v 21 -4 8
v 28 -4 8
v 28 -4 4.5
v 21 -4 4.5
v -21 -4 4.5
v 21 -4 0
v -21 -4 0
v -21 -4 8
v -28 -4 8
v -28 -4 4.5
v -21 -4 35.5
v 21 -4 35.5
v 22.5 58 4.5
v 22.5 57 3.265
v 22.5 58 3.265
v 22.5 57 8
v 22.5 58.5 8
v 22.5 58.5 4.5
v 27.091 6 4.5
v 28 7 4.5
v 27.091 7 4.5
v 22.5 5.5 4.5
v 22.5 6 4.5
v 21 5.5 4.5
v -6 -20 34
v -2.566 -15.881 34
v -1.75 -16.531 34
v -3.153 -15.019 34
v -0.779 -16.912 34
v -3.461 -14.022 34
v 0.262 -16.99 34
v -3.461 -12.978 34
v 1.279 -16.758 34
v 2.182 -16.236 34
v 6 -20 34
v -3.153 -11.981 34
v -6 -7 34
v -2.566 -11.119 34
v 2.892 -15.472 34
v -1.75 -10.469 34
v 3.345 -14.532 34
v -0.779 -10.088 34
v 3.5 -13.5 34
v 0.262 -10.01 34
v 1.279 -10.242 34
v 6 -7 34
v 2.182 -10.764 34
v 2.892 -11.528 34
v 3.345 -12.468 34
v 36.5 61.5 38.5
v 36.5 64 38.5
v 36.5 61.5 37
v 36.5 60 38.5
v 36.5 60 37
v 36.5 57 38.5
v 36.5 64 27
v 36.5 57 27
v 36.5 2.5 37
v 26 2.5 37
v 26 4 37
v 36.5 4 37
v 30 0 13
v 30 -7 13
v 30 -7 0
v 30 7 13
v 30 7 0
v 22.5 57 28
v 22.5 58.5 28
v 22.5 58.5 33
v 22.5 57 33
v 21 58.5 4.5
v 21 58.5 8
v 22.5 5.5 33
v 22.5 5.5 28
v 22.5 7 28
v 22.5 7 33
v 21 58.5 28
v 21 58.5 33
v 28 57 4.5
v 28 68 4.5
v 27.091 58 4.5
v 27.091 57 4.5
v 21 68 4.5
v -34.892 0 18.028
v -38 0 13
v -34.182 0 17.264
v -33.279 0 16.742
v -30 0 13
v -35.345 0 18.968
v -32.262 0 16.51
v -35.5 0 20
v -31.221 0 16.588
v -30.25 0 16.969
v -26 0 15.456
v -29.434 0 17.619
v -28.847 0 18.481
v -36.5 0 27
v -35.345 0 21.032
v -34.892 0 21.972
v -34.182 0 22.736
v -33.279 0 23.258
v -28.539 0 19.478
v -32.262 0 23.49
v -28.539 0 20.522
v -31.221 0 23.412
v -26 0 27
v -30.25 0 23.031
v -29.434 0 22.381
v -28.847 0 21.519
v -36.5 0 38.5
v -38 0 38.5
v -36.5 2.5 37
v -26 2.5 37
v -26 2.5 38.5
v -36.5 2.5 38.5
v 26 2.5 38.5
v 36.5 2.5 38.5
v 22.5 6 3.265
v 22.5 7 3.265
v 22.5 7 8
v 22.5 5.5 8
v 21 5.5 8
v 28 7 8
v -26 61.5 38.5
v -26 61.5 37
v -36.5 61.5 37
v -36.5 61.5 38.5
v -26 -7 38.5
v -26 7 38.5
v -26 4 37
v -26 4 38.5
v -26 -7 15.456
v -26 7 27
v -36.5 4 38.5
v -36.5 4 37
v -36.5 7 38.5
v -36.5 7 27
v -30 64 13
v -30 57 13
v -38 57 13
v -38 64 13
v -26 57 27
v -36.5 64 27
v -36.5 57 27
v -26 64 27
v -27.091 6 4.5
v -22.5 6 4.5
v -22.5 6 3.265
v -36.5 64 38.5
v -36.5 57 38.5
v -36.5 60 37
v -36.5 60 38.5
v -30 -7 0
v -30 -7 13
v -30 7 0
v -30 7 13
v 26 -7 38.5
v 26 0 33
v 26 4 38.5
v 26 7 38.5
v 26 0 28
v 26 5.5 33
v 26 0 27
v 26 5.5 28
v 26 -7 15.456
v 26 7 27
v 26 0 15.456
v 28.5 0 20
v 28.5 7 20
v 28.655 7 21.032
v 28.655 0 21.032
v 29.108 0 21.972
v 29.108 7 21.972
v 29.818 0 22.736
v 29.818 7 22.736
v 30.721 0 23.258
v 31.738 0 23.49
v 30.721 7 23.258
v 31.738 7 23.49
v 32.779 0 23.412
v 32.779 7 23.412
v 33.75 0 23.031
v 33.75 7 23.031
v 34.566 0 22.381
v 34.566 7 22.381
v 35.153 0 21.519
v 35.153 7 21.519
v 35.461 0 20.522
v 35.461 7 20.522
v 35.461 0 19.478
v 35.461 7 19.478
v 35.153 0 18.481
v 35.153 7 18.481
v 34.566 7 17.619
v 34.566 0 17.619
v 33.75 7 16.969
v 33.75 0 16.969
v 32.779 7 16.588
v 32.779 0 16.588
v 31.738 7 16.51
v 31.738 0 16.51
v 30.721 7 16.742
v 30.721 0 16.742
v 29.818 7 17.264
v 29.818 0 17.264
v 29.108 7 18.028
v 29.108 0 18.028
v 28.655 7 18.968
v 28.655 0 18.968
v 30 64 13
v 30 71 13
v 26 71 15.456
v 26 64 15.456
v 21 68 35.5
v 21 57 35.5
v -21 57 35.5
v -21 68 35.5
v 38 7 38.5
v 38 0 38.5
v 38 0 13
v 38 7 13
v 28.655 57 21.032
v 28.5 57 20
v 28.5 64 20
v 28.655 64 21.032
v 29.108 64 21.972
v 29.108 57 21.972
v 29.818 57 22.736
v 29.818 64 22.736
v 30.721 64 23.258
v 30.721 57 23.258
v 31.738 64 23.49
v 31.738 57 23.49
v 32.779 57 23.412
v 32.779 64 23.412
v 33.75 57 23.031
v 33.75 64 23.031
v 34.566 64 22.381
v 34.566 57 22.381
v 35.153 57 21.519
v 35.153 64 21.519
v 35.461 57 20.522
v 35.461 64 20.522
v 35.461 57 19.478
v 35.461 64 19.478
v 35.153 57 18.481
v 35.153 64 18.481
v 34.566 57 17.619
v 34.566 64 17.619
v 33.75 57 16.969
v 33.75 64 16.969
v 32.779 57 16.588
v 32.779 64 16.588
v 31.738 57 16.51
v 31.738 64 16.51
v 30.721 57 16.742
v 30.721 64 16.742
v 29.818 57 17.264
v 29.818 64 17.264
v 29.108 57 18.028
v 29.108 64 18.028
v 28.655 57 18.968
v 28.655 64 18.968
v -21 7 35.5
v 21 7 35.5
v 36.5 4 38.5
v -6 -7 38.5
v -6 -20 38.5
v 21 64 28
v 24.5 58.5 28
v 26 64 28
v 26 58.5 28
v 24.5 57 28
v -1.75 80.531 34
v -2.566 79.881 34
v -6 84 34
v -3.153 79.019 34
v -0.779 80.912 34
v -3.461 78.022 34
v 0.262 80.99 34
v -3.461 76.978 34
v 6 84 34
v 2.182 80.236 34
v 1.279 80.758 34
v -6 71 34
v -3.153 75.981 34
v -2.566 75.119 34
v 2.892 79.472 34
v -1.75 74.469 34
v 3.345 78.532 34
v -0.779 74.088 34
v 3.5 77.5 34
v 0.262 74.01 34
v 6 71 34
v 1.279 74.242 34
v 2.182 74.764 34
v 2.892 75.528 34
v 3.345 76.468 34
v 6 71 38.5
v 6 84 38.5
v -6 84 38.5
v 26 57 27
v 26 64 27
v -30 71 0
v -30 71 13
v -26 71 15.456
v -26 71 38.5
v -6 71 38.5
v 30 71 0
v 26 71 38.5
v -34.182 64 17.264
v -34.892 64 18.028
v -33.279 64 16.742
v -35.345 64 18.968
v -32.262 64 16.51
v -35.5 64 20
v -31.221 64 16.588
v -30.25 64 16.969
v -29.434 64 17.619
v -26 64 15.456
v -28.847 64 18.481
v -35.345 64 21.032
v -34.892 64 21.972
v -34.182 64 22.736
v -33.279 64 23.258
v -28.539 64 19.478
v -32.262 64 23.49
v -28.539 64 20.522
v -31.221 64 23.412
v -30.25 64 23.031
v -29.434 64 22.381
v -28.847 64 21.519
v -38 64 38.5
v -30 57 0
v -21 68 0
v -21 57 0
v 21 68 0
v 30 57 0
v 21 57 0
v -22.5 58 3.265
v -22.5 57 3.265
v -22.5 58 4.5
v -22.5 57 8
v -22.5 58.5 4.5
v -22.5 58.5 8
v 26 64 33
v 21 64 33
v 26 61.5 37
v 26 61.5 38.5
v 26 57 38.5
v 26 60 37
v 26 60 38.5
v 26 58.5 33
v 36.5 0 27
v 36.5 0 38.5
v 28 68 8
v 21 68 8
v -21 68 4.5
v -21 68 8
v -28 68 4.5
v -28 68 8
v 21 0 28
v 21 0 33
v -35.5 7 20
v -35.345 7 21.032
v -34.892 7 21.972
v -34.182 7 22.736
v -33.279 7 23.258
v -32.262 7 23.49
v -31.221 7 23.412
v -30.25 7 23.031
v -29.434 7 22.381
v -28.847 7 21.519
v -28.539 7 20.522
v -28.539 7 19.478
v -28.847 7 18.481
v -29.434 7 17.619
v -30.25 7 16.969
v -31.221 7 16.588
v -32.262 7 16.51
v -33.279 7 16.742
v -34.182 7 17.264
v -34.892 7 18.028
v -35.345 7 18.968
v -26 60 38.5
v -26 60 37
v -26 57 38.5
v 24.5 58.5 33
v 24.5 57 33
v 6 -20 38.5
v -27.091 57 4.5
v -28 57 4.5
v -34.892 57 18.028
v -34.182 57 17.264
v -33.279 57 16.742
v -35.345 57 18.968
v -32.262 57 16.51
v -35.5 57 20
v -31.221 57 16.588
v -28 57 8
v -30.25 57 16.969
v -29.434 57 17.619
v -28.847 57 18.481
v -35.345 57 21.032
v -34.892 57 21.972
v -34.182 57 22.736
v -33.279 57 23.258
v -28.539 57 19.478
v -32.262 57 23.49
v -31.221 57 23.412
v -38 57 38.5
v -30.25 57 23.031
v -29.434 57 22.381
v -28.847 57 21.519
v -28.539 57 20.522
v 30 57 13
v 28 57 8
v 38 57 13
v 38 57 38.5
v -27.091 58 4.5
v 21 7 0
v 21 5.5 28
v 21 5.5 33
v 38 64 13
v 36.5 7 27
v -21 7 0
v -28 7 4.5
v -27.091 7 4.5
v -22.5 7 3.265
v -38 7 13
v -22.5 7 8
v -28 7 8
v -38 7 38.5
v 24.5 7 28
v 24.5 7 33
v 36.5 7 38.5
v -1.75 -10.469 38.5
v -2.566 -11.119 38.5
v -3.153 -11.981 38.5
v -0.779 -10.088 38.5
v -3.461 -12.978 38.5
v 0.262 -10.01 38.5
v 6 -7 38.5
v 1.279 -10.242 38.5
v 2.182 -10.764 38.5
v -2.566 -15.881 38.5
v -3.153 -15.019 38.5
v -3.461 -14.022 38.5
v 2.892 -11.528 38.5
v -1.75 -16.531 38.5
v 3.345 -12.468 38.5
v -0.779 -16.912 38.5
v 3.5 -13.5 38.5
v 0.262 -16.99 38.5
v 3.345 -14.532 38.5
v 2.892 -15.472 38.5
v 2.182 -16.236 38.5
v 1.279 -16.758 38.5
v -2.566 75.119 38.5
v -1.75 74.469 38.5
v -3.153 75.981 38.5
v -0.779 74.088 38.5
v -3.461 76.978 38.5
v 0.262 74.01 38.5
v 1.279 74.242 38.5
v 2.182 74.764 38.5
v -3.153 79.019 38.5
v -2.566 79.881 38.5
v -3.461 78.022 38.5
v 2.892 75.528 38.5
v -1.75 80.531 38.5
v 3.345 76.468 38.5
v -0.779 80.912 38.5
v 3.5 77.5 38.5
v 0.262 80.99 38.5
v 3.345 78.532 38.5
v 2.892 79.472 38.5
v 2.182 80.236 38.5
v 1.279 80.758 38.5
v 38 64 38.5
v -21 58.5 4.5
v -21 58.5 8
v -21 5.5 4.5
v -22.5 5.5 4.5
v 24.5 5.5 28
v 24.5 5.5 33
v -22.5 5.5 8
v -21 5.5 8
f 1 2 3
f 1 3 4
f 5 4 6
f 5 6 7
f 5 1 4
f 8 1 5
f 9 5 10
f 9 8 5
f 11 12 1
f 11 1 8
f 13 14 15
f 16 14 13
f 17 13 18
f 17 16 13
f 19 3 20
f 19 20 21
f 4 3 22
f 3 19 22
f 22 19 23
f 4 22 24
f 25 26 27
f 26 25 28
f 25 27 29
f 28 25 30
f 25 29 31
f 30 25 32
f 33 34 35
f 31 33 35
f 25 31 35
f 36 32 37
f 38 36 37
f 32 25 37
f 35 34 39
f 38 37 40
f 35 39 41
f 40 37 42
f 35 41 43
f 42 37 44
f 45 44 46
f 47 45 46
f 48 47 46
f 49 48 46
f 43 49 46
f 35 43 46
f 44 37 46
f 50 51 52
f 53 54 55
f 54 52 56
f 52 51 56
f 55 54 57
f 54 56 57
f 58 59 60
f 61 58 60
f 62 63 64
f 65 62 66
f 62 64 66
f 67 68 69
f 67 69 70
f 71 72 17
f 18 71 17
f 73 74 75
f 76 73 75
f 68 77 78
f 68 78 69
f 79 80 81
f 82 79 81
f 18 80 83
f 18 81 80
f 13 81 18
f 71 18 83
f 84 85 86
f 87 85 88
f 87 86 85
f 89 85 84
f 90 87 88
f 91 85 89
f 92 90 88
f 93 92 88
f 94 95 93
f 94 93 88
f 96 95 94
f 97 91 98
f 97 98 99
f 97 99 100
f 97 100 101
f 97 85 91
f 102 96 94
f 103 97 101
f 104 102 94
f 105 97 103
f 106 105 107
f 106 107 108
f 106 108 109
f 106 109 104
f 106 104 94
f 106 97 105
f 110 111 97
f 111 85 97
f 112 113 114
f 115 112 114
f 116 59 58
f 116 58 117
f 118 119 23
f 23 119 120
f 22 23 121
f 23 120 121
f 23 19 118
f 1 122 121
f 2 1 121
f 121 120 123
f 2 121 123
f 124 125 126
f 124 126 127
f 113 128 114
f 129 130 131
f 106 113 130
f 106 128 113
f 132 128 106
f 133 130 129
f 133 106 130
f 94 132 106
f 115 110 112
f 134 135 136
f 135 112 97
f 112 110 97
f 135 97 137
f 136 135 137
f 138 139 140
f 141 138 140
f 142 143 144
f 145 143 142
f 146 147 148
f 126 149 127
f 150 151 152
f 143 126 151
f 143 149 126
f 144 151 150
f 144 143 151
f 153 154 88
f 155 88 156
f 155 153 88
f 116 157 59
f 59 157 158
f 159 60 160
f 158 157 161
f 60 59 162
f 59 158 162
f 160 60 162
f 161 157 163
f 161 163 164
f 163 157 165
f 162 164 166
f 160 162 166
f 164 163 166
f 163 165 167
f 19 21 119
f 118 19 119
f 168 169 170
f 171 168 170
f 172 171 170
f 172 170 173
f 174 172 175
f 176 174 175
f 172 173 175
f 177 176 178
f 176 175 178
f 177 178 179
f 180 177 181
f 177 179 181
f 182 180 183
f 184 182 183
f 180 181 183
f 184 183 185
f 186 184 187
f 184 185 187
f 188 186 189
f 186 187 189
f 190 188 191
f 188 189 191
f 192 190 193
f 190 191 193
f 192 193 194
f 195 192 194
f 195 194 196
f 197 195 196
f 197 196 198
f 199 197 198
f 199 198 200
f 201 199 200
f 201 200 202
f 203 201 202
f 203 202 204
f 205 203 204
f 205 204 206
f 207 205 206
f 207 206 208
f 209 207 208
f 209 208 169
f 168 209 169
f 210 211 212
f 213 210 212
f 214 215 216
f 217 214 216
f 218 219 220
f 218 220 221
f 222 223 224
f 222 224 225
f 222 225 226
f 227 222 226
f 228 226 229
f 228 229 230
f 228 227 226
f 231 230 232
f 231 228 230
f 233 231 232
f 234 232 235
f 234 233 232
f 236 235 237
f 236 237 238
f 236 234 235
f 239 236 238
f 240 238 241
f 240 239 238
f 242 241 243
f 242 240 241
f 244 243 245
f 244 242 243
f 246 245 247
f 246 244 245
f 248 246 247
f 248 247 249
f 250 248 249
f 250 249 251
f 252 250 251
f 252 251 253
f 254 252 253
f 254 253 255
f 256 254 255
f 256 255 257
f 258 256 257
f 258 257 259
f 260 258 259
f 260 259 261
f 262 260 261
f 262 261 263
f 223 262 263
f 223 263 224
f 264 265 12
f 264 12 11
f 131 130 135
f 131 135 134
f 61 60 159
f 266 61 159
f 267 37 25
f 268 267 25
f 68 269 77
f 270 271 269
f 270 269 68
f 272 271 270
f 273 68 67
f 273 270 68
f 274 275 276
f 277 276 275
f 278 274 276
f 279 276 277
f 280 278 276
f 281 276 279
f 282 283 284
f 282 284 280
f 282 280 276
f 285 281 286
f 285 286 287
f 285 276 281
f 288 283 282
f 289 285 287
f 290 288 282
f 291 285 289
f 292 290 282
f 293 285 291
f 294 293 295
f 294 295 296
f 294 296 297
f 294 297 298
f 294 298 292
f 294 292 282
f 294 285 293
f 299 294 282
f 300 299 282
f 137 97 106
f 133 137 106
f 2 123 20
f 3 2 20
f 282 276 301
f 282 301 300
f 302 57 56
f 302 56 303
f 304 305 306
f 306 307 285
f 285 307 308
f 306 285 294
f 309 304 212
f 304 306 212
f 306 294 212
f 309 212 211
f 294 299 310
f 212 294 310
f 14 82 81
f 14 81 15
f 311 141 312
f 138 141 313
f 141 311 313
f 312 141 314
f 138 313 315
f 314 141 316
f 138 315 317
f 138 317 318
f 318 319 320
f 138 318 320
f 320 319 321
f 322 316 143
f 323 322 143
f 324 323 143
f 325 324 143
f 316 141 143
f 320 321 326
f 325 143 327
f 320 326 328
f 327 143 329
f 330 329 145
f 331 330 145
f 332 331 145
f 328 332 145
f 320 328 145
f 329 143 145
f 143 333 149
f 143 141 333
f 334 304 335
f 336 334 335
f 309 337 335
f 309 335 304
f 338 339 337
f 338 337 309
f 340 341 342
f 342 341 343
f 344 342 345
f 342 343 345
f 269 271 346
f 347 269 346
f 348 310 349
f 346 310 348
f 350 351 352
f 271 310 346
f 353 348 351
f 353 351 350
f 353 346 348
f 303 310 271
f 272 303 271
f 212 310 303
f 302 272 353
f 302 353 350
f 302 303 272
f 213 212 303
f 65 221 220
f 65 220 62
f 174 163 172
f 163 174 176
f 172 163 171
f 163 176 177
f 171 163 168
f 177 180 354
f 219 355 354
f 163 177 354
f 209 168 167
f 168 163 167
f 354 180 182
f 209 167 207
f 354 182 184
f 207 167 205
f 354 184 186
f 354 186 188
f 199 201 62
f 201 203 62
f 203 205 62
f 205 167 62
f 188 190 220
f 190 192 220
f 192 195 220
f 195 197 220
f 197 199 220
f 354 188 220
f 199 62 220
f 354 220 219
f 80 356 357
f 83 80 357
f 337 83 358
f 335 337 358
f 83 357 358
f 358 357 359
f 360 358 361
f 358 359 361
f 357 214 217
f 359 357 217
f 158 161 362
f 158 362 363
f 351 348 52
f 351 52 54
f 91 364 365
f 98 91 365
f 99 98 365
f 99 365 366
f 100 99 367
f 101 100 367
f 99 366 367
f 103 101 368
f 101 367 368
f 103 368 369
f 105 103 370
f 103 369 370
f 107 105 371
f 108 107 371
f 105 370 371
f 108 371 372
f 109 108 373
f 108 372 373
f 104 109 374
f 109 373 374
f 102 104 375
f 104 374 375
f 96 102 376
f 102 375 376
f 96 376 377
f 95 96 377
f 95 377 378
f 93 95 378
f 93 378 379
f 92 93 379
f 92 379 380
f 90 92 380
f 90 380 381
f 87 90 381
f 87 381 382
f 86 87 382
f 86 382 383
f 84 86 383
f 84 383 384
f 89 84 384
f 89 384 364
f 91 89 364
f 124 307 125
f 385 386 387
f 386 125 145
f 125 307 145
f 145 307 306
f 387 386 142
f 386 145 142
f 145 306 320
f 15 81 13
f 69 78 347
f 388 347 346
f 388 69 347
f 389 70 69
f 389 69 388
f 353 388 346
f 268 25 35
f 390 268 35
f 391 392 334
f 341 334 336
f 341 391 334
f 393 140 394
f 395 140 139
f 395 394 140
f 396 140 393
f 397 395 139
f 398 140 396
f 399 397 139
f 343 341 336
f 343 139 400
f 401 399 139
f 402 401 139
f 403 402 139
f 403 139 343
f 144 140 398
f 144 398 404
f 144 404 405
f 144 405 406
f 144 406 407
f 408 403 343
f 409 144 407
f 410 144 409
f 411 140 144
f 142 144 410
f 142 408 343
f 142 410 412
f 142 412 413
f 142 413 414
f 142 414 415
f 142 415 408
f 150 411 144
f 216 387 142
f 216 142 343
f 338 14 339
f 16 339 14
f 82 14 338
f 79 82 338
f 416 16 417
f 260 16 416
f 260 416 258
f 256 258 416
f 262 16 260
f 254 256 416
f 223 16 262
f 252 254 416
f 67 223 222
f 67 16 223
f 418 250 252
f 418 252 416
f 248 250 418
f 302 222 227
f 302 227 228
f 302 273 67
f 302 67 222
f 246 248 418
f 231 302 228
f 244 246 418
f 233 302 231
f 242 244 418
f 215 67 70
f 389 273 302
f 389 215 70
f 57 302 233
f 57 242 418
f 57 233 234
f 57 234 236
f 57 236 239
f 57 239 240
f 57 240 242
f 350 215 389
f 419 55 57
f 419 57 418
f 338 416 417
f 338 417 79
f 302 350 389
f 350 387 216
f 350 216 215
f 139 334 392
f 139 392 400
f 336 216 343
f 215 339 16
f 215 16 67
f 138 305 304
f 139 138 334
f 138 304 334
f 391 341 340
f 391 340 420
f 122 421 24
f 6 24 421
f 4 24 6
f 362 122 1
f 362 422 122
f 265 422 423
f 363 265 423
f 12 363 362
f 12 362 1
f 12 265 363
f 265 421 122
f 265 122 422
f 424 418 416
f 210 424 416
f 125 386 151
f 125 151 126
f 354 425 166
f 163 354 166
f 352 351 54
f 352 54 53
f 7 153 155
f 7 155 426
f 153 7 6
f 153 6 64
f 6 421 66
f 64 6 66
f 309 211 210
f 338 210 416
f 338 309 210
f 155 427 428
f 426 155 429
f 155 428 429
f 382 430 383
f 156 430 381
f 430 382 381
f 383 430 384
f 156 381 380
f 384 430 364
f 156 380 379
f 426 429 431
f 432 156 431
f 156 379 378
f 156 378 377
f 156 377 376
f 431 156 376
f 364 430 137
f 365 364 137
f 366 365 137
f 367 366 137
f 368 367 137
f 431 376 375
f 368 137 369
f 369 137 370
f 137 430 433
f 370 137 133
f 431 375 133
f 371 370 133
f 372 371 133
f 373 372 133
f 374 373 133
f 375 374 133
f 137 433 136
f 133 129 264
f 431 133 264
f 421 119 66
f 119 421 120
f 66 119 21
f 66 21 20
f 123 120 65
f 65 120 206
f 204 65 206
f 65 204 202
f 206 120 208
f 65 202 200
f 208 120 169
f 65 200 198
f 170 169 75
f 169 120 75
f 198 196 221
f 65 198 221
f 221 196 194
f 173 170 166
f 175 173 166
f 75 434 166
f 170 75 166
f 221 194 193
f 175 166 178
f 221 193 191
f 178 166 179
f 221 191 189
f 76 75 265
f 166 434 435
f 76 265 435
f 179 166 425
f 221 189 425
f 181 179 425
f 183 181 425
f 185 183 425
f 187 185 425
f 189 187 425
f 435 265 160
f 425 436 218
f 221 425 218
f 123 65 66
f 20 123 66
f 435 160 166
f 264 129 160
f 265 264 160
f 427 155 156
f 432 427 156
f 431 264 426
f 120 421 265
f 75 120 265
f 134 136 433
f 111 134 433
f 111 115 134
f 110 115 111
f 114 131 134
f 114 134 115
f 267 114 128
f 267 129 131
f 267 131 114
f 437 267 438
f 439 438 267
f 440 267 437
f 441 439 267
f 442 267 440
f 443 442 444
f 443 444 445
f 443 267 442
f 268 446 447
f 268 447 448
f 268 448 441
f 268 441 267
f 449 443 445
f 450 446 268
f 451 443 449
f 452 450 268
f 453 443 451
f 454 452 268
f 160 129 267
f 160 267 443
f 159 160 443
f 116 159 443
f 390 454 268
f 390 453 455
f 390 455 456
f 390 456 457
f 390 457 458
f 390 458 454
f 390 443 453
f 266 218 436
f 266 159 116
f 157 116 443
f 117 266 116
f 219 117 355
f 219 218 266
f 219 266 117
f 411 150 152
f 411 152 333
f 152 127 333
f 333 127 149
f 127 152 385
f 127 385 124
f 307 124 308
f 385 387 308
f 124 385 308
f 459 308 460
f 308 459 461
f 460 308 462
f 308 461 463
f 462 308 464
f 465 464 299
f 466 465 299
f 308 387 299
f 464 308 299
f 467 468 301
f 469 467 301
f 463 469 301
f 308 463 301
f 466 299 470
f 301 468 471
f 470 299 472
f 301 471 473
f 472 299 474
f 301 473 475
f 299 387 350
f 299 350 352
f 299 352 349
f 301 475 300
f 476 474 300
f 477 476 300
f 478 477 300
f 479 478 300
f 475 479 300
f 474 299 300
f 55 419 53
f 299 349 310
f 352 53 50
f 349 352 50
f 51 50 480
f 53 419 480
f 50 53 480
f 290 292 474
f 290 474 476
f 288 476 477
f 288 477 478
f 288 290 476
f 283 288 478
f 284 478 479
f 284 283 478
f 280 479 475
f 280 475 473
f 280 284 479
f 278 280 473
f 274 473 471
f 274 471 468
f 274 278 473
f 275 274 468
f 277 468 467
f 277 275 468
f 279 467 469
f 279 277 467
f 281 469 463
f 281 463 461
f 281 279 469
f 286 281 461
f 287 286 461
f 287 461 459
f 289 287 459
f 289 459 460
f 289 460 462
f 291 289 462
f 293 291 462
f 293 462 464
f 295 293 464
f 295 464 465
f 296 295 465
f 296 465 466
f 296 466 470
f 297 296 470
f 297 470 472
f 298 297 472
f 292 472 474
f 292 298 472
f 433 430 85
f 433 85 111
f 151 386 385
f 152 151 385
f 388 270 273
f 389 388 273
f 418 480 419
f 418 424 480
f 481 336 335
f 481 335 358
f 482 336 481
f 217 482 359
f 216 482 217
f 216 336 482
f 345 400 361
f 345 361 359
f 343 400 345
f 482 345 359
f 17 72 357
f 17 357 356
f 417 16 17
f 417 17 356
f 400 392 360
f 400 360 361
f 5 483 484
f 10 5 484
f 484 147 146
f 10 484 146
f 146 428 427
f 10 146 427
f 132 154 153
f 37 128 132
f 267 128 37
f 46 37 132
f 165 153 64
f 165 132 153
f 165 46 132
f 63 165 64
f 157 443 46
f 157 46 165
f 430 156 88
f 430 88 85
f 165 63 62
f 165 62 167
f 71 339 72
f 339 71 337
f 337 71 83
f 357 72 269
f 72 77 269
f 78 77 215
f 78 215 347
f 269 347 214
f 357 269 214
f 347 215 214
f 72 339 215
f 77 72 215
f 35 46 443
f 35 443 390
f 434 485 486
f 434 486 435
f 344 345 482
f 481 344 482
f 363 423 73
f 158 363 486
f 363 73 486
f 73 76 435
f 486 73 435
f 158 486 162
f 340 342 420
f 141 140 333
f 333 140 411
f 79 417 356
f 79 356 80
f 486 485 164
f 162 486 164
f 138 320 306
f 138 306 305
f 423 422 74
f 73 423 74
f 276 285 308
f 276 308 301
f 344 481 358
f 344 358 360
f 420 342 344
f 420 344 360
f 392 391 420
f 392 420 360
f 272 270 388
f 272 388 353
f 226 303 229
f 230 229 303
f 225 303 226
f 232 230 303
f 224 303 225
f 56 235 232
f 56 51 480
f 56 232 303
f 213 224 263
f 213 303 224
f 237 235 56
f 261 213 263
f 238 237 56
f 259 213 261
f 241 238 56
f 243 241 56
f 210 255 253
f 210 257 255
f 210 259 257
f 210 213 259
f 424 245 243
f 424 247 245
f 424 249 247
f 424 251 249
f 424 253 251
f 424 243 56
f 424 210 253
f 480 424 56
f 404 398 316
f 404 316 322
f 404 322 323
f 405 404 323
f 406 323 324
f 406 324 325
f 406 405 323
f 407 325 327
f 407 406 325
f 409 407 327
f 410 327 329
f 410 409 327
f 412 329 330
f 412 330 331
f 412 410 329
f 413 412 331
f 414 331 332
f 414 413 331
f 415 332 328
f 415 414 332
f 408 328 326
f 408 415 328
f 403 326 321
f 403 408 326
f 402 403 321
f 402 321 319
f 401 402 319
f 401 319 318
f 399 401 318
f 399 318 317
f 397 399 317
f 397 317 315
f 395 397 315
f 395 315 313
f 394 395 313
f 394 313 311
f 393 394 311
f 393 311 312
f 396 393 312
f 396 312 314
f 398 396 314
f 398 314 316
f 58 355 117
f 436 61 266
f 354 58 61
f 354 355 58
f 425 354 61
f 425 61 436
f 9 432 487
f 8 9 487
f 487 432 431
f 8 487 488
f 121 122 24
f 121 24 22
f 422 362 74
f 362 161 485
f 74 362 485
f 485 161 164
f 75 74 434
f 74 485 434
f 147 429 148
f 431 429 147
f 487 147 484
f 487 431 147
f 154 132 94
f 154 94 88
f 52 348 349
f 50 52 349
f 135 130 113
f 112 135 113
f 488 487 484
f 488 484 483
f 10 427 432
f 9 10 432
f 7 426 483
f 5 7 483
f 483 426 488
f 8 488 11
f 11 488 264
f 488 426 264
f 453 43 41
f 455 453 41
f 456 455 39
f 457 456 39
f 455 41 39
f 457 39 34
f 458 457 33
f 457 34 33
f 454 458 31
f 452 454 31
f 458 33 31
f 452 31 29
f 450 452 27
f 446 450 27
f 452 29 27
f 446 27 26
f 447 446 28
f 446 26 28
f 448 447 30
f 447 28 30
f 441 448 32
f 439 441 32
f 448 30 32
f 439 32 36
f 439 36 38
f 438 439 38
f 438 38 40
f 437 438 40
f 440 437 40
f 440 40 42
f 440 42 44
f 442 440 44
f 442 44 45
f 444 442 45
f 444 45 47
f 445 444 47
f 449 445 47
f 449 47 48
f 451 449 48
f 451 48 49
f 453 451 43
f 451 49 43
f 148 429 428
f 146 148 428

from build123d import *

# Parameters (mm, degrees)
F0_W      = 60
F0_H      = 14
F1_DEPTH  = 36
F3_W      = 42
F3_H      = 11
F4_DEPTH  = 25
F5_W      = 42
F5_H      = 4.5
F6_DEPTH  = 11
F7_W      = 8
F7_H      = 14
F8_DEPTH  = 14
F9_R      = 3.5
F10_DEPTH = 14
F11_W     = 12
F11_H     = 14
F12_DEPTH = 7
F13_W     = 4
F13_H     = 9
F14_DEPTH = 14
F15_W     = 7
F15_H     = 5
F16_DEPTH = 5
F18_DEPTH = 1
F19_W     = 12
F19_H     = 5
F20_DEPTH = 13
F21_R     = 3.5
F22_DEPTH = 5
F26_DEPTH = 2.5
F27_W     = 42
F27_H     = 2.5
F28_DEPTH = 11
F29_DEPTH = 3
F30_W     = 1.5
F30_H     = 7
F31_DEPTH = 11.5
F32_W     = 1.5
F32_H     = 1.5
F33_DEPTH = 5
F34_W     = 1.5
F34_H     = 1.5
F35_DEPTH = 6
F37_DEPTH = 7
F38_W     = 1.5
F38_H     = 1.5
F39_DEPTH = 11
F40_W     = 1.5
F40_H     = 1.5
F41_DEPTH = 11


with BuildPart() as f1:
    # F0 (on Top) → F1 (new body)
    with BuildSketch(Plane.XY):
        Rectangle(F0_W, F0_H)
    extrude(amount=F1_DEPTH)

    # F3 (on offset) → F4 (cut)
    with BuildSketch(Plane.XY.offset(33)):
        with Locations((0, 1.5)):
            Rectangle(F3_W, F3_H)
    extrude(amount=-F4_DEPTH, mode=Mode.SUBTRACT)

    # F5 (on face) → F6 (cut)
    with BuildSketch(Plane(origin=(0, 7, 0), x_dir=(-1, 0, 0), z_dir=(0, 1, 0))):
        Polygon((21, 4.5), (28, 4.5), (28, 8), (21, 8), (-21, 8), (-28, 8), (-28, 4.5), (-21, 4.5), align=None)
        with Locations((0, 2.25)):
            Rectangle(F5_W, F5_H)
    extrude(amount=-F6_DEPTH, mode=Mode.SUBTRACT)

    # F7 (on face) → F8 (join)
    with BuildSketch(Plane(origin=(0, 7, 0), x_dir=(-1, 0, 0), z_dir=(0, 1, 0))):
        with Locations((34, 20)):
            Rectangle(F7_W, F7_H)
        with Locations((-34, 20)):
            Rectangle(F7_W, F7_H)
    extrude(amount=-F8_DEPTH)

    # F9 (on face) → F10 (cut)
    with BuildSketch(Plane(origin=(0, 7, 0), x_dir=(-1, 0, 0), z_dir=(0, 1, 0))):
        with Locations((32, 20)):
            Circle(F9_R)
        with Locations((-32, 20)):
            Circle(F9_R)
    extrude(amount=-F10_DEPTH, mode=Mode.SUBTRACT)

    # F11 (on face) → F12 (cut)
    with BuildSketch(Plane.XZ.offset(7)):
        with Locations((32, 20)):
            Rectangle(F11_W, F11_H)
        with Locations((-32, 20)):
            Rectangle(F11_W, F11_H)
    extrude(amount=-F12_DEPTH, mode=Mode.SUBTRACT)

    # F13 (on face) → F14 (cut)
    with BuildSketch(Plane.XZ.offset(7)):
        with Locations((28, 31.5)):
            Rectangle(F13_W, F13_H)
        with Locations((-28, 31.5)):
            Rectangle(F13_W, F13_H)
    extrude(amount=-F14_DEPTH, mode=Mode.SUBTRACT)

    # F15 (on face) → F16 (cut)
    with BuildSketch(Plane.YZ.offset(26)):
        with Locations((3.5, 30.5)):
            Rectangle(F15_W, F15_H)
    extrude(amount=-F16_DEPTH, mode=Mode.SUBTRACT)

    # F17 (on face) → F18 (cut)
    with BuildSketch(Plane(origin=(0, 7, 0), x_dir=(-1, 0, 0), z_dir=(0, 1, 0))):
        Polygon((-27.0907673985, 4.5), (-21, 2.8613428585), (-21, 4.5), align=None)
        Polygon((21, 4.5), (21, 2.8613428585), (27.0907673985, 4.5), align=None)
    extrude(amount=-F18_DEPTH, mode=Mode.SUBTRACT)

    # F19 (on face) → F20 (join)
    with BuildSketch(Plane.XZ.offset(7)):
        with Locations((0, 33.5)):
            Rectangle(F19_W, F19_H)
    extrude(amount=F20_DEPTH)

    # F21 (on face) → F22 (cut)
    with BuildSketch(Plane(origin=(0, 0, 31), x_dir=(1, 0, 0), z_dir=(0, 0, -1))):
        with Locations((0, 13.5)):
            Circle(F21_R)
    extrude(amount=-F22_DEPTH, mode=Mode.SUBTRACT)

    # F26 (add): a face of the model
    f26_faces = [f1.faces().sort_by_distance(p)[0] for p in [
        (0, -1.8763217631, 36),
    ]]
    extrude(f26_faces, amount=F26_DEPTH)

    # F27 (on face) → F28 (cut)
    with BuildSketch(Plane(origin=(0, 7, 0), x_dir=(-1, 0, 0), z_dir=(0, 1, 0))):
        with Locations((0, 34.25)):
            Rectangle(F27_W, F27_H)
    extrude(amount=-F28_DEPTH, mode=Mode.SUBTRACT)

    # F29 (cut): a face of the model
    f29_faces = [f1.faces().sort_by_distance(p)[0] for p in [
        (-5.8230819399, -13.5, 31),
    ]]
    extrude(f29_faces, amount=-F29_DEPTH, mode=Mode.SUBTRACT)

    # F30 (on face) → F31 (join)
    with BuildSketch(Plane.XY.offset(27)):
        with Locations((37.25, 3.5)):
            Rectangle(F30_W, F30_H)
        with Locations((-37.25, 3.5)):
            Rectangle(F30_W, F30_H)
    extrude(amount=F31_DEPTH)

    # F32 (on face) → F33 (join)
    with BuildSketch(Plane.XY.offset(28)):
        with Locations((25.25, 6.25)):
            Rectangle(F32_W, F32_H)
        with Locations((21.75, 6.25)):
            Rectangle(F32_W, F32_H)
    extrude(amount=F33_DEPTH)

    # F34 (on face) → F35 (join)
    with BuildSketch(Plane(origin=(0, 0, 8), x_dir=(1, 0, 0), z_dir=(0, 0, -1))):
        with Locations((21.75, -6.25)):
            Rectangle(F34_W, F34_H)
        with Locations((-21.75, -6.25)):
            Rectangle(F34_W, F34_H)
    extrude(amount=F35_DEPTH)

    # F36 (on face) → F37 (join)
    with BuildSketch(Plane.XZ.offset(7)):
        Polygon((-26, 13), (-26, 15.456433408), (-30, 13), align=None)
        Polygon((26, 15.456433408), (26, 13), (30, 13), align=None)
    extrude(amount=-F37_DEPTH)

    # F38 (on face) → F39 (join)
    with BuildSketch(Plane.YZ.offset(26)):
        with Locations((3.25, 37.75)):
            Rectangle(F38_W, F38_H)
    extrude(amount=F39_DEPTH)

    # F40 (on face) → F41 (join)
    with BuildSketch(Plane(origin=(-26, 0, 0), x_dir=(0, -1, 0), z_dir=(-1, 0, 0))):
        with Locations((-3.25, 37.75)):
            Rectangle(F40_W, F40_H)
    extrude(amount=F41_DEPTH)


with BuildPart() as f42_1:
    # F42: instance of F1
    add(f1.part.mirror(Plane(origin=(27.9952492859, 32, 16.1474245819), x_dir=(-1, 0, 0), z_dir=(0, 1, 0))))


solid = Compound([f1.part, f42_1.part])
